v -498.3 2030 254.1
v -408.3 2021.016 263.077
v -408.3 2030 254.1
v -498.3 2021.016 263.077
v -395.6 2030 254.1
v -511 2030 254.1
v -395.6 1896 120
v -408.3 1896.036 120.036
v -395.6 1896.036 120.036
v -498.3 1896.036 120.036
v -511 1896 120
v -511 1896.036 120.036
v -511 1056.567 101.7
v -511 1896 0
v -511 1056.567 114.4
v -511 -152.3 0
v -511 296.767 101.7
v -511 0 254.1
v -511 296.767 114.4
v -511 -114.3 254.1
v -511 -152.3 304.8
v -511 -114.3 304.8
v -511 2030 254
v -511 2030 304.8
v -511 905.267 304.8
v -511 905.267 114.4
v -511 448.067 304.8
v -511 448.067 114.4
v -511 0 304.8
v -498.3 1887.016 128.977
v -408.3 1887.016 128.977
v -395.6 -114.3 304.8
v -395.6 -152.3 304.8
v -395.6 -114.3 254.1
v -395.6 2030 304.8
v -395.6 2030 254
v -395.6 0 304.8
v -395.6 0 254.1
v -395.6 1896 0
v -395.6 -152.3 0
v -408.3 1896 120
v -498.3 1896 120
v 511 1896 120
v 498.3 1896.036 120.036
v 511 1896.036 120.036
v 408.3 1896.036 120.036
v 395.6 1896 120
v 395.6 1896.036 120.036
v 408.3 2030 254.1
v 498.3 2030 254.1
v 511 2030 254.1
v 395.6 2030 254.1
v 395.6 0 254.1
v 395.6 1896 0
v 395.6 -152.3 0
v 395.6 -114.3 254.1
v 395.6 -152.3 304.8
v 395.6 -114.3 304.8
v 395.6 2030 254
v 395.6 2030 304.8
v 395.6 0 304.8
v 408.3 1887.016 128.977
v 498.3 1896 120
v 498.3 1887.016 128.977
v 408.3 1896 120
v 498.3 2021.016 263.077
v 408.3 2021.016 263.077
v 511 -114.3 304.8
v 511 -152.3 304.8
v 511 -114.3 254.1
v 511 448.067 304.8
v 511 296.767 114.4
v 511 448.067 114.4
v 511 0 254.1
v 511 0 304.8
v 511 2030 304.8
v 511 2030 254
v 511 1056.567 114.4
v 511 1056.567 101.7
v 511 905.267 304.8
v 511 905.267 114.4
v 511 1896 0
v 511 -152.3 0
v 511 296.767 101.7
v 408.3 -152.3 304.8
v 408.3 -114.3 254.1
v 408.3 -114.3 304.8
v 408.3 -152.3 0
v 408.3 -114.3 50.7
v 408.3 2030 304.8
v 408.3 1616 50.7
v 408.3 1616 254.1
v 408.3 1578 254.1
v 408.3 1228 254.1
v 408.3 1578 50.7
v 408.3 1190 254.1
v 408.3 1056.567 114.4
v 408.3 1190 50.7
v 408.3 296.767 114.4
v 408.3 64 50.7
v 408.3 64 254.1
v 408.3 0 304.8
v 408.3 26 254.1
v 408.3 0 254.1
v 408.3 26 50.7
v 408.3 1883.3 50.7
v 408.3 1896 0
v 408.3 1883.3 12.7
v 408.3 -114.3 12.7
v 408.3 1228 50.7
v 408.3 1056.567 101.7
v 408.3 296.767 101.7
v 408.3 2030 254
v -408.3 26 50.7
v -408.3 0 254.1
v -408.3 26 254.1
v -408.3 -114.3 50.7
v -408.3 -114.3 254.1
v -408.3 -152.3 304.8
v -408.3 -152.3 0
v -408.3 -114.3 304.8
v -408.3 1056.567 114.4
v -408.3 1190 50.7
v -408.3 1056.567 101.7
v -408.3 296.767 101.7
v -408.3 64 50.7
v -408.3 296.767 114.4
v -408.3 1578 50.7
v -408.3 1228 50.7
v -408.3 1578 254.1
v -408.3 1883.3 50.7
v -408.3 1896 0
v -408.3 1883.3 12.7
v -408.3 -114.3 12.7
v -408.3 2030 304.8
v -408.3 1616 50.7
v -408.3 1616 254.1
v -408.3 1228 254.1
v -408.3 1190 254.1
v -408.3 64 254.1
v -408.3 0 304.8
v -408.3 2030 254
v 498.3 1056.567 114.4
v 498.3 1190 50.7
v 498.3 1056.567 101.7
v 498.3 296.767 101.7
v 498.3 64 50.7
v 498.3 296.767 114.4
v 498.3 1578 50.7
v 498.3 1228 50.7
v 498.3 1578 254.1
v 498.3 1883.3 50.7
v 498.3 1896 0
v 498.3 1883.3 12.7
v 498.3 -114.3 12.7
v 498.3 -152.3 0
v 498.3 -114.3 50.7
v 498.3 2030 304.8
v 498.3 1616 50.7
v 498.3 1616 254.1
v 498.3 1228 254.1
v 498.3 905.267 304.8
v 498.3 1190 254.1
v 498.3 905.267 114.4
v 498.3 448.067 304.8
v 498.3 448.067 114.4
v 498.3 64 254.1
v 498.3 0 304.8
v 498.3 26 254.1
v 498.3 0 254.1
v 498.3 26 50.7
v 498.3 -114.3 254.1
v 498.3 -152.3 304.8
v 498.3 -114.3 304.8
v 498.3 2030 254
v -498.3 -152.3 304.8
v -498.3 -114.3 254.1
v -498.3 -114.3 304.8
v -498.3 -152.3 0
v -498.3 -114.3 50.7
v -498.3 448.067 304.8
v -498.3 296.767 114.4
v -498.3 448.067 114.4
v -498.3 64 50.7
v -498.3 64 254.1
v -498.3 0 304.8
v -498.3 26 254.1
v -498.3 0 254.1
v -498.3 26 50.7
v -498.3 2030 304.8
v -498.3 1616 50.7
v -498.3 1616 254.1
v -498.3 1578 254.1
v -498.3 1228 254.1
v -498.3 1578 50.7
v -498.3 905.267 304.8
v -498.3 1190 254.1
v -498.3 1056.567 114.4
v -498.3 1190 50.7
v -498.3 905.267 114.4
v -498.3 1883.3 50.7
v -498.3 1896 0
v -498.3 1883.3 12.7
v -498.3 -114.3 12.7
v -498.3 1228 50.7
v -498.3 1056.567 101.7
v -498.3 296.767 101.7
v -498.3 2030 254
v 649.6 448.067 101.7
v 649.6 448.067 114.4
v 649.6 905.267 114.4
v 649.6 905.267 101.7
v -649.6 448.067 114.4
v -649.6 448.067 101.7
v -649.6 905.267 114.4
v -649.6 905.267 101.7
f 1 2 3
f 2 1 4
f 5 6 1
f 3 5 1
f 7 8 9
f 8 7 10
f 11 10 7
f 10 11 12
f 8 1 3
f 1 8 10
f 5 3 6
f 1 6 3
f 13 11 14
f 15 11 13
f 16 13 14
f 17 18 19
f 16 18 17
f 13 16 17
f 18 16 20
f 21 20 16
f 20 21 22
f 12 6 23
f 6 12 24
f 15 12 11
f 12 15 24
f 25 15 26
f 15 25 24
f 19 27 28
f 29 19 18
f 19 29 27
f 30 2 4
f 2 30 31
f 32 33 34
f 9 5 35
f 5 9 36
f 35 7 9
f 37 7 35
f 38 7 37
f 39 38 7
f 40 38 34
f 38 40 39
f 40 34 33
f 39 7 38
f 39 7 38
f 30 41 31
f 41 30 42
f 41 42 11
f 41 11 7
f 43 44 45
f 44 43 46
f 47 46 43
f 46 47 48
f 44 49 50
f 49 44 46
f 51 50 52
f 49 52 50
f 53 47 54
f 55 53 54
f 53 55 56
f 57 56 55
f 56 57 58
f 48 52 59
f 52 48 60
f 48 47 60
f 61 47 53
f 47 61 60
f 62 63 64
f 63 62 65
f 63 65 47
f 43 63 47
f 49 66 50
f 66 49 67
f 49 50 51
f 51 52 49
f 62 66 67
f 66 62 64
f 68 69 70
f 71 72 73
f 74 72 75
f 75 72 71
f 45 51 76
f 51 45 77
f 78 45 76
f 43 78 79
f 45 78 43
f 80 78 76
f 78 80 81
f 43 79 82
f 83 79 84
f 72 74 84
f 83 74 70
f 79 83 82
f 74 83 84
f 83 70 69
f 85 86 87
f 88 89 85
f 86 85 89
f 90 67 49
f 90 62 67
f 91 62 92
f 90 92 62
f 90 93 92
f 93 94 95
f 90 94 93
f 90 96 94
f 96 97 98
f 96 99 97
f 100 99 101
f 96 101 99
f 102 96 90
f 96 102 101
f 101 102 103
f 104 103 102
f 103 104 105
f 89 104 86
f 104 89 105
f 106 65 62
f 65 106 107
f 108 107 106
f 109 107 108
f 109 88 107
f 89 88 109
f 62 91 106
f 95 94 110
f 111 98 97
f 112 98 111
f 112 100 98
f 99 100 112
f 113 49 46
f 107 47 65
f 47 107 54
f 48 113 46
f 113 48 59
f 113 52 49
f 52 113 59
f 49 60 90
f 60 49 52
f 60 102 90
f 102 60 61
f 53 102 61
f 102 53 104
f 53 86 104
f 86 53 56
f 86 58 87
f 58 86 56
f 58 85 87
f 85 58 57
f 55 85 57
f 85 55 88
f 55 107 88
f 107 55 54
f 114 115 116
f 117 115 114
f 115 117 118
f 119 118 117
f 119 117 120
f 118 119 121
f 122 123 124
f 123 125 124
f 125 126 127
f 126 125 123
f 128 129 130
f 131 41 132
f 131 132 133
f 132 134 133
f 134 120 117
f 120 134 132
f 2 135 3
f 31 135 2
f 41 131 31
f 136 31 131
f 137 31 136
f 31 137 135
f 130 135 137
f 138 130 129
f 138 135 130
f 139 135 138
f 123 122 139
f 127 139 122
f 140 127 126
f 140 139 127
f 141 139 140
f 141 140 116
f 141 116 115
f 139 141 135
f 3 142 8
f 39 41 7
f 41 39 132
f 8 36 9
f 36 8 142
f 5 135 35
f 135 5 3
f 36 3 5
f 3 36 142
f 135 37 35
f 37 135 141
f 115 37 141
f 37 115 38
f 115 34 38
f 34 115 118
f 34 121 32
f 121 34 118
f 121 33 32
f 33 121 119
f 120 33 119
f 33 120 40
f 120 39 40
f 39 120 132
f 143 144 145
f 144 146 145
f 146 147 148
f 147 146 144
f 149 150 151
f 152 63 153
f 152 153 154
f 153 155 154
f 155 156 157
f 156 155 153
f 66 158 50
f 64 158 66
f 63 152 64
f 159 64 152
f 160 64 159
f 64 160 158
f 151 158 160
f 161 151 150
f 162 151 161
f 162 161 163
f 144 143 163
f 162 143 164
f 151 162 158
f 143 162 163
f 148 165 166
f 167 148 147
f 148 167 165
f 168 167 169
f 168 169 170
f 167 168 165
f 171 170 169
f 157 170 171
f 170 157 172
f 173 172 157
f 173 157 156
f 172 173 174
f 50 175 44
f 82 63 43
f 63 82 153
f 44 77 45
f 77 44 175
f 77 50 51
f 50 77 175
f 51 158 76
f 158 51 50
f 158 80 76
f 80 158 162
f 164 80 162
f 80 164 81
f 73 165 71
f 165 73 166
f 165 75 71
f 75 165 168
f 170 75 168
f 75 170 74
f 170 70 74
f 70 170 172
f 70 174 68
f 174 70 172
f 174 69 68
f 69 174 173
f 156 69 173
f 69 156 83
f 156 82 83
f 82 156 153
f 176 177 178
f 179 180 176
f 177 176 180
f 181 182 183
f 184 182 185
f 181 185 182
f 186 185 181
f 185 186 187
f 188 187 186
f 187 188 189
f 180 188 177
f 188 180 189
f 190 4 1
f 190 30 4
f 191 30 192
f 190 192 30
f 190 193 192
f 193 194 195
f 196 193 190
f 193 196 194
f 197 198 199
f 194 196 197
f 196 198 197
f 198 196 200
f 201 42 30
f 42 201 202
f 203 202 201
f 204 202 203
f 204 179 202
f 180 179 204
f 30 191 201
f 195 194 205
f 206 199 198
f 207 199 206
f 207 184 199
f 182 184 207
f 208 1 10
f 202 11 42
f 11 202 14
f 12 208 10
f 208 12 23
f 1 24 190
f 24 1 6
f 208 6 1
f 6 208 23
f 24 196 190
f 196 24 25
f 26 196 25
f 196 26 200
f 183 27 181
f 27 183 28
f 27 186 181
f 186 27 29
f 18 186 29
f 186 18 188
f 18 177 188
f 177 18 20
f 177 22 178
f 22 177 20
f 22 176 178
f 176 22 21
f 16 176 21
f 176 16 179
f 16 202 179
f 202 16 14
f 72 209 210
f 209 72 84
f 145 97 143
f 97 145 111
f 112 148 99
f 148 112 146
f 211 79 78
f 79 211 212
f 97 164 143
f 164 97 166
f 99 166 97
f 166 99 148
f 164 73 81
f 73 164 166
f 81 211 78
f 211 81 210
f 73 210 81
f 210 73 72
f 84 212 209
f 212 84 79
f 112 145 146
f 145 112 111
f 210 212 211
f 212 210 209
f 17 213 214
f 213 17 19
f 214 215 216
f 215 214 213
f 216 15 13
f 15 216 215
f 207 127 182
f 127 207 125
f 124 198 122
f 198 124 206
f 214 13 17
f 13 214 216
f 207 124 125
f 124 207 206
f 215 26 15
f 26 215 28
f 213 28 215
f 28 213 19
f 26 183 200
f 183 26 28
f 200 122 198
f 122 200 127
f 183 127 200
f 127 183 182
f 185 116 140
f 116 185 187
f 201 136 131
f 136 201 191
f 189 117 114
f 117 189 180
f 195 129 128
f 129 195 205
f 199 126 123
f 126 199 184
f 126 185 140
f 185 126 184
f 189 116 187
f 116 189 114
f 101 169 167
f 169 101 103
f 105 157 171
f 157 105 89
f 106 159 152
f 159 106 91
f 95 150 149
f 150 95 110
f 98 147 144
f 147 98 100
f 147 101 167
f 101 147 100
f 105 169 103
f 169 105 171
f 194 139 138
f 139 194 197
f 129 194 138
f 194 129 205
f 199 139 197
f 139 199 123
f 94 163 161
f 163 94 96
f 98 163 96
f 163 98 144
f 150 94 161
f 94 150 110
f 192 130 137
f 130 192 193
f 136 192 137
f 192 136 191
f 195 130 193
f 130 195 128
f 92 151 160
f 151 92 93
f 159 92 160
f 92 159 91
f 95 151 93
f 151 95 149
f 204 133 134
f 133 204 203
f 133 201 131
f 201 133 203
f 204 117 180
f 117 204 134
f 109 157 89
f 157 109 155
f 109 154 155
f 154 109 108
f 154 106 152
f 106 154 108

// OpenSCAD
// file: common.scad
pad=0.1;
in=25.4;
zero=0.01;

wood=in/2;
// 2x4 actual dimensions
two=38;
four=90;

neato=120;

bed_x=1530;
bed_y=2030;
bed_z=12*in;
bed_wood=wood;

overhang=10*in;
front_overhang=overhang-neato;

caster_x=20.5;
caster_y=42;
wheel_z=28;

leg_angle=atan(front_overhang/(bed_z-bed_wood-two-neato));
function leg_y(z)=bed_y-overhang+tan(leg_angle)*z-wood;
leg_x=four+wood*2;

mattress_r=2*in;

pillowboard_y=4*in;
pillowboard_depth=bed_wood+two;

spine_end=0;
spines=6;
spine_gap=(bed_y-four-spine_end*2)/(spines-1);
back_overhang=0;
leg_y=bed_y-back_overhang-front_overhang;

module corner(r) {
	offset(r*2)
	offset(-r*2)
	children();
}

module wood(w=wood) {
	linear_extrude(height=w)
	children();
}

module dirror_y(y=0) {
	children();
	translate([0,y])
	mirror([0,1])
	children();

}

module dirror_x(x=0) {
	children();
	translate([x,0])
	mirror([1,0])
	children();

}
// main file
include <common.scad>

edge=2*in;

leg_face=(bed_z-bed_wood-two-neato)/cos(leg_angle);


chilisleep_x=350;
chilisleep_y=390;
chilisleep_z_min=170;
chilisleep_z_cap=210;
chilisleep_z_cup=290;

sleepnumber_x=180; // includes cord
sleepnumber_y=330; // includes hoses
sleepnumber_z=125;

pump_x=10*in;
pump_y=18*in;
pump_z=6*in;
pump_ramp=pump_x-four-wood;
pump_center=bed_y/3;

leveler_gap=in/2;
leveler=leg_y(0)+pillowboard_y+wood+neato;

headboard_extra=pillowboard_y+wood+two;

// RENDER svg
module pump_shelf() {
	translate([0,-pump_y/2-pump_ramp,0])
	hull() {
		translate([pump_x-zero,pump_ramp])
		square([zero,pump_y]);
		square([leg_x,pump_y+pump_ramp*2]);
	}
}

module leg_face() {
	square([leg_x,leg_face]);
}


module leg_side_positive() {
	hull() {
		translate([0,-back_overhang])
		square([edge,bed_y+headboard_extra]);
		square([bed_z-neato,leg_y+headboard_extra]);
	}
	square([bed_z,leg_y+headboard_extra]);
}


module leg_side() {
	difference() {
		translate([0,-headboard_extra])
		leg_side_positive();

		translate([-pad,-wood-pillowboard_y])
		square([pillowboard_depth+pad,pillowboard_y+wood]);
	}
}


module outer_leg_side() {
	difference() {
		leg_side();
		translate([-pad,pump_center-pump_y/2,0])
		square([pump_z+bed_wood+two+pad,pump_y]);
	}
}

module legs() {

	color("cyan")
	dirror_x()
	translate([overhang-bed_x/2,leg_y,neato])
	rotate([90-leg_angle,0])
	wood()
	leg_face();

	color("gold")
	dirror_x()
	translate([bed_x/2-overhang-leg_x,back_overhang,bed_z])
	rotate([0,90])
	wood()
	leg_side();

	color("cyan")
	dirror_x()
	translate([bed_x/2-overhang-wood,back_overhang,bed_z])
	rotate([0,90])
	wood()
	outer_leg_side();

	dirror_x()
	translate([bed_x/2-overhang-leg_x,pump_center,bed_z-bed_wood-two-pump_z])
	wood()
	pump_shelf();

}

module leg_ribs() {
	module rib(n=0) {
		dirror_x()
		translate([-bed_x/2+overhang+wood,four/2-two/2+spine_gap*n,two+leveler_gap])
		color("magenta")
		cube([four,two,bed_z-bed_wood-two*2-leveler_gap]);
	}

	rib();
	rib(3);
	rib(4);
}

module leveler() {
	dirror_x()
	translate([overhang+wood-bed_x/2,-pillowboard_y-wood,leveler_gap])
	cube([four,leveler,two]);
}

module legs_handcut() {
	leg_ribs();
	leveler();
}

legs();
legs_handcut();
